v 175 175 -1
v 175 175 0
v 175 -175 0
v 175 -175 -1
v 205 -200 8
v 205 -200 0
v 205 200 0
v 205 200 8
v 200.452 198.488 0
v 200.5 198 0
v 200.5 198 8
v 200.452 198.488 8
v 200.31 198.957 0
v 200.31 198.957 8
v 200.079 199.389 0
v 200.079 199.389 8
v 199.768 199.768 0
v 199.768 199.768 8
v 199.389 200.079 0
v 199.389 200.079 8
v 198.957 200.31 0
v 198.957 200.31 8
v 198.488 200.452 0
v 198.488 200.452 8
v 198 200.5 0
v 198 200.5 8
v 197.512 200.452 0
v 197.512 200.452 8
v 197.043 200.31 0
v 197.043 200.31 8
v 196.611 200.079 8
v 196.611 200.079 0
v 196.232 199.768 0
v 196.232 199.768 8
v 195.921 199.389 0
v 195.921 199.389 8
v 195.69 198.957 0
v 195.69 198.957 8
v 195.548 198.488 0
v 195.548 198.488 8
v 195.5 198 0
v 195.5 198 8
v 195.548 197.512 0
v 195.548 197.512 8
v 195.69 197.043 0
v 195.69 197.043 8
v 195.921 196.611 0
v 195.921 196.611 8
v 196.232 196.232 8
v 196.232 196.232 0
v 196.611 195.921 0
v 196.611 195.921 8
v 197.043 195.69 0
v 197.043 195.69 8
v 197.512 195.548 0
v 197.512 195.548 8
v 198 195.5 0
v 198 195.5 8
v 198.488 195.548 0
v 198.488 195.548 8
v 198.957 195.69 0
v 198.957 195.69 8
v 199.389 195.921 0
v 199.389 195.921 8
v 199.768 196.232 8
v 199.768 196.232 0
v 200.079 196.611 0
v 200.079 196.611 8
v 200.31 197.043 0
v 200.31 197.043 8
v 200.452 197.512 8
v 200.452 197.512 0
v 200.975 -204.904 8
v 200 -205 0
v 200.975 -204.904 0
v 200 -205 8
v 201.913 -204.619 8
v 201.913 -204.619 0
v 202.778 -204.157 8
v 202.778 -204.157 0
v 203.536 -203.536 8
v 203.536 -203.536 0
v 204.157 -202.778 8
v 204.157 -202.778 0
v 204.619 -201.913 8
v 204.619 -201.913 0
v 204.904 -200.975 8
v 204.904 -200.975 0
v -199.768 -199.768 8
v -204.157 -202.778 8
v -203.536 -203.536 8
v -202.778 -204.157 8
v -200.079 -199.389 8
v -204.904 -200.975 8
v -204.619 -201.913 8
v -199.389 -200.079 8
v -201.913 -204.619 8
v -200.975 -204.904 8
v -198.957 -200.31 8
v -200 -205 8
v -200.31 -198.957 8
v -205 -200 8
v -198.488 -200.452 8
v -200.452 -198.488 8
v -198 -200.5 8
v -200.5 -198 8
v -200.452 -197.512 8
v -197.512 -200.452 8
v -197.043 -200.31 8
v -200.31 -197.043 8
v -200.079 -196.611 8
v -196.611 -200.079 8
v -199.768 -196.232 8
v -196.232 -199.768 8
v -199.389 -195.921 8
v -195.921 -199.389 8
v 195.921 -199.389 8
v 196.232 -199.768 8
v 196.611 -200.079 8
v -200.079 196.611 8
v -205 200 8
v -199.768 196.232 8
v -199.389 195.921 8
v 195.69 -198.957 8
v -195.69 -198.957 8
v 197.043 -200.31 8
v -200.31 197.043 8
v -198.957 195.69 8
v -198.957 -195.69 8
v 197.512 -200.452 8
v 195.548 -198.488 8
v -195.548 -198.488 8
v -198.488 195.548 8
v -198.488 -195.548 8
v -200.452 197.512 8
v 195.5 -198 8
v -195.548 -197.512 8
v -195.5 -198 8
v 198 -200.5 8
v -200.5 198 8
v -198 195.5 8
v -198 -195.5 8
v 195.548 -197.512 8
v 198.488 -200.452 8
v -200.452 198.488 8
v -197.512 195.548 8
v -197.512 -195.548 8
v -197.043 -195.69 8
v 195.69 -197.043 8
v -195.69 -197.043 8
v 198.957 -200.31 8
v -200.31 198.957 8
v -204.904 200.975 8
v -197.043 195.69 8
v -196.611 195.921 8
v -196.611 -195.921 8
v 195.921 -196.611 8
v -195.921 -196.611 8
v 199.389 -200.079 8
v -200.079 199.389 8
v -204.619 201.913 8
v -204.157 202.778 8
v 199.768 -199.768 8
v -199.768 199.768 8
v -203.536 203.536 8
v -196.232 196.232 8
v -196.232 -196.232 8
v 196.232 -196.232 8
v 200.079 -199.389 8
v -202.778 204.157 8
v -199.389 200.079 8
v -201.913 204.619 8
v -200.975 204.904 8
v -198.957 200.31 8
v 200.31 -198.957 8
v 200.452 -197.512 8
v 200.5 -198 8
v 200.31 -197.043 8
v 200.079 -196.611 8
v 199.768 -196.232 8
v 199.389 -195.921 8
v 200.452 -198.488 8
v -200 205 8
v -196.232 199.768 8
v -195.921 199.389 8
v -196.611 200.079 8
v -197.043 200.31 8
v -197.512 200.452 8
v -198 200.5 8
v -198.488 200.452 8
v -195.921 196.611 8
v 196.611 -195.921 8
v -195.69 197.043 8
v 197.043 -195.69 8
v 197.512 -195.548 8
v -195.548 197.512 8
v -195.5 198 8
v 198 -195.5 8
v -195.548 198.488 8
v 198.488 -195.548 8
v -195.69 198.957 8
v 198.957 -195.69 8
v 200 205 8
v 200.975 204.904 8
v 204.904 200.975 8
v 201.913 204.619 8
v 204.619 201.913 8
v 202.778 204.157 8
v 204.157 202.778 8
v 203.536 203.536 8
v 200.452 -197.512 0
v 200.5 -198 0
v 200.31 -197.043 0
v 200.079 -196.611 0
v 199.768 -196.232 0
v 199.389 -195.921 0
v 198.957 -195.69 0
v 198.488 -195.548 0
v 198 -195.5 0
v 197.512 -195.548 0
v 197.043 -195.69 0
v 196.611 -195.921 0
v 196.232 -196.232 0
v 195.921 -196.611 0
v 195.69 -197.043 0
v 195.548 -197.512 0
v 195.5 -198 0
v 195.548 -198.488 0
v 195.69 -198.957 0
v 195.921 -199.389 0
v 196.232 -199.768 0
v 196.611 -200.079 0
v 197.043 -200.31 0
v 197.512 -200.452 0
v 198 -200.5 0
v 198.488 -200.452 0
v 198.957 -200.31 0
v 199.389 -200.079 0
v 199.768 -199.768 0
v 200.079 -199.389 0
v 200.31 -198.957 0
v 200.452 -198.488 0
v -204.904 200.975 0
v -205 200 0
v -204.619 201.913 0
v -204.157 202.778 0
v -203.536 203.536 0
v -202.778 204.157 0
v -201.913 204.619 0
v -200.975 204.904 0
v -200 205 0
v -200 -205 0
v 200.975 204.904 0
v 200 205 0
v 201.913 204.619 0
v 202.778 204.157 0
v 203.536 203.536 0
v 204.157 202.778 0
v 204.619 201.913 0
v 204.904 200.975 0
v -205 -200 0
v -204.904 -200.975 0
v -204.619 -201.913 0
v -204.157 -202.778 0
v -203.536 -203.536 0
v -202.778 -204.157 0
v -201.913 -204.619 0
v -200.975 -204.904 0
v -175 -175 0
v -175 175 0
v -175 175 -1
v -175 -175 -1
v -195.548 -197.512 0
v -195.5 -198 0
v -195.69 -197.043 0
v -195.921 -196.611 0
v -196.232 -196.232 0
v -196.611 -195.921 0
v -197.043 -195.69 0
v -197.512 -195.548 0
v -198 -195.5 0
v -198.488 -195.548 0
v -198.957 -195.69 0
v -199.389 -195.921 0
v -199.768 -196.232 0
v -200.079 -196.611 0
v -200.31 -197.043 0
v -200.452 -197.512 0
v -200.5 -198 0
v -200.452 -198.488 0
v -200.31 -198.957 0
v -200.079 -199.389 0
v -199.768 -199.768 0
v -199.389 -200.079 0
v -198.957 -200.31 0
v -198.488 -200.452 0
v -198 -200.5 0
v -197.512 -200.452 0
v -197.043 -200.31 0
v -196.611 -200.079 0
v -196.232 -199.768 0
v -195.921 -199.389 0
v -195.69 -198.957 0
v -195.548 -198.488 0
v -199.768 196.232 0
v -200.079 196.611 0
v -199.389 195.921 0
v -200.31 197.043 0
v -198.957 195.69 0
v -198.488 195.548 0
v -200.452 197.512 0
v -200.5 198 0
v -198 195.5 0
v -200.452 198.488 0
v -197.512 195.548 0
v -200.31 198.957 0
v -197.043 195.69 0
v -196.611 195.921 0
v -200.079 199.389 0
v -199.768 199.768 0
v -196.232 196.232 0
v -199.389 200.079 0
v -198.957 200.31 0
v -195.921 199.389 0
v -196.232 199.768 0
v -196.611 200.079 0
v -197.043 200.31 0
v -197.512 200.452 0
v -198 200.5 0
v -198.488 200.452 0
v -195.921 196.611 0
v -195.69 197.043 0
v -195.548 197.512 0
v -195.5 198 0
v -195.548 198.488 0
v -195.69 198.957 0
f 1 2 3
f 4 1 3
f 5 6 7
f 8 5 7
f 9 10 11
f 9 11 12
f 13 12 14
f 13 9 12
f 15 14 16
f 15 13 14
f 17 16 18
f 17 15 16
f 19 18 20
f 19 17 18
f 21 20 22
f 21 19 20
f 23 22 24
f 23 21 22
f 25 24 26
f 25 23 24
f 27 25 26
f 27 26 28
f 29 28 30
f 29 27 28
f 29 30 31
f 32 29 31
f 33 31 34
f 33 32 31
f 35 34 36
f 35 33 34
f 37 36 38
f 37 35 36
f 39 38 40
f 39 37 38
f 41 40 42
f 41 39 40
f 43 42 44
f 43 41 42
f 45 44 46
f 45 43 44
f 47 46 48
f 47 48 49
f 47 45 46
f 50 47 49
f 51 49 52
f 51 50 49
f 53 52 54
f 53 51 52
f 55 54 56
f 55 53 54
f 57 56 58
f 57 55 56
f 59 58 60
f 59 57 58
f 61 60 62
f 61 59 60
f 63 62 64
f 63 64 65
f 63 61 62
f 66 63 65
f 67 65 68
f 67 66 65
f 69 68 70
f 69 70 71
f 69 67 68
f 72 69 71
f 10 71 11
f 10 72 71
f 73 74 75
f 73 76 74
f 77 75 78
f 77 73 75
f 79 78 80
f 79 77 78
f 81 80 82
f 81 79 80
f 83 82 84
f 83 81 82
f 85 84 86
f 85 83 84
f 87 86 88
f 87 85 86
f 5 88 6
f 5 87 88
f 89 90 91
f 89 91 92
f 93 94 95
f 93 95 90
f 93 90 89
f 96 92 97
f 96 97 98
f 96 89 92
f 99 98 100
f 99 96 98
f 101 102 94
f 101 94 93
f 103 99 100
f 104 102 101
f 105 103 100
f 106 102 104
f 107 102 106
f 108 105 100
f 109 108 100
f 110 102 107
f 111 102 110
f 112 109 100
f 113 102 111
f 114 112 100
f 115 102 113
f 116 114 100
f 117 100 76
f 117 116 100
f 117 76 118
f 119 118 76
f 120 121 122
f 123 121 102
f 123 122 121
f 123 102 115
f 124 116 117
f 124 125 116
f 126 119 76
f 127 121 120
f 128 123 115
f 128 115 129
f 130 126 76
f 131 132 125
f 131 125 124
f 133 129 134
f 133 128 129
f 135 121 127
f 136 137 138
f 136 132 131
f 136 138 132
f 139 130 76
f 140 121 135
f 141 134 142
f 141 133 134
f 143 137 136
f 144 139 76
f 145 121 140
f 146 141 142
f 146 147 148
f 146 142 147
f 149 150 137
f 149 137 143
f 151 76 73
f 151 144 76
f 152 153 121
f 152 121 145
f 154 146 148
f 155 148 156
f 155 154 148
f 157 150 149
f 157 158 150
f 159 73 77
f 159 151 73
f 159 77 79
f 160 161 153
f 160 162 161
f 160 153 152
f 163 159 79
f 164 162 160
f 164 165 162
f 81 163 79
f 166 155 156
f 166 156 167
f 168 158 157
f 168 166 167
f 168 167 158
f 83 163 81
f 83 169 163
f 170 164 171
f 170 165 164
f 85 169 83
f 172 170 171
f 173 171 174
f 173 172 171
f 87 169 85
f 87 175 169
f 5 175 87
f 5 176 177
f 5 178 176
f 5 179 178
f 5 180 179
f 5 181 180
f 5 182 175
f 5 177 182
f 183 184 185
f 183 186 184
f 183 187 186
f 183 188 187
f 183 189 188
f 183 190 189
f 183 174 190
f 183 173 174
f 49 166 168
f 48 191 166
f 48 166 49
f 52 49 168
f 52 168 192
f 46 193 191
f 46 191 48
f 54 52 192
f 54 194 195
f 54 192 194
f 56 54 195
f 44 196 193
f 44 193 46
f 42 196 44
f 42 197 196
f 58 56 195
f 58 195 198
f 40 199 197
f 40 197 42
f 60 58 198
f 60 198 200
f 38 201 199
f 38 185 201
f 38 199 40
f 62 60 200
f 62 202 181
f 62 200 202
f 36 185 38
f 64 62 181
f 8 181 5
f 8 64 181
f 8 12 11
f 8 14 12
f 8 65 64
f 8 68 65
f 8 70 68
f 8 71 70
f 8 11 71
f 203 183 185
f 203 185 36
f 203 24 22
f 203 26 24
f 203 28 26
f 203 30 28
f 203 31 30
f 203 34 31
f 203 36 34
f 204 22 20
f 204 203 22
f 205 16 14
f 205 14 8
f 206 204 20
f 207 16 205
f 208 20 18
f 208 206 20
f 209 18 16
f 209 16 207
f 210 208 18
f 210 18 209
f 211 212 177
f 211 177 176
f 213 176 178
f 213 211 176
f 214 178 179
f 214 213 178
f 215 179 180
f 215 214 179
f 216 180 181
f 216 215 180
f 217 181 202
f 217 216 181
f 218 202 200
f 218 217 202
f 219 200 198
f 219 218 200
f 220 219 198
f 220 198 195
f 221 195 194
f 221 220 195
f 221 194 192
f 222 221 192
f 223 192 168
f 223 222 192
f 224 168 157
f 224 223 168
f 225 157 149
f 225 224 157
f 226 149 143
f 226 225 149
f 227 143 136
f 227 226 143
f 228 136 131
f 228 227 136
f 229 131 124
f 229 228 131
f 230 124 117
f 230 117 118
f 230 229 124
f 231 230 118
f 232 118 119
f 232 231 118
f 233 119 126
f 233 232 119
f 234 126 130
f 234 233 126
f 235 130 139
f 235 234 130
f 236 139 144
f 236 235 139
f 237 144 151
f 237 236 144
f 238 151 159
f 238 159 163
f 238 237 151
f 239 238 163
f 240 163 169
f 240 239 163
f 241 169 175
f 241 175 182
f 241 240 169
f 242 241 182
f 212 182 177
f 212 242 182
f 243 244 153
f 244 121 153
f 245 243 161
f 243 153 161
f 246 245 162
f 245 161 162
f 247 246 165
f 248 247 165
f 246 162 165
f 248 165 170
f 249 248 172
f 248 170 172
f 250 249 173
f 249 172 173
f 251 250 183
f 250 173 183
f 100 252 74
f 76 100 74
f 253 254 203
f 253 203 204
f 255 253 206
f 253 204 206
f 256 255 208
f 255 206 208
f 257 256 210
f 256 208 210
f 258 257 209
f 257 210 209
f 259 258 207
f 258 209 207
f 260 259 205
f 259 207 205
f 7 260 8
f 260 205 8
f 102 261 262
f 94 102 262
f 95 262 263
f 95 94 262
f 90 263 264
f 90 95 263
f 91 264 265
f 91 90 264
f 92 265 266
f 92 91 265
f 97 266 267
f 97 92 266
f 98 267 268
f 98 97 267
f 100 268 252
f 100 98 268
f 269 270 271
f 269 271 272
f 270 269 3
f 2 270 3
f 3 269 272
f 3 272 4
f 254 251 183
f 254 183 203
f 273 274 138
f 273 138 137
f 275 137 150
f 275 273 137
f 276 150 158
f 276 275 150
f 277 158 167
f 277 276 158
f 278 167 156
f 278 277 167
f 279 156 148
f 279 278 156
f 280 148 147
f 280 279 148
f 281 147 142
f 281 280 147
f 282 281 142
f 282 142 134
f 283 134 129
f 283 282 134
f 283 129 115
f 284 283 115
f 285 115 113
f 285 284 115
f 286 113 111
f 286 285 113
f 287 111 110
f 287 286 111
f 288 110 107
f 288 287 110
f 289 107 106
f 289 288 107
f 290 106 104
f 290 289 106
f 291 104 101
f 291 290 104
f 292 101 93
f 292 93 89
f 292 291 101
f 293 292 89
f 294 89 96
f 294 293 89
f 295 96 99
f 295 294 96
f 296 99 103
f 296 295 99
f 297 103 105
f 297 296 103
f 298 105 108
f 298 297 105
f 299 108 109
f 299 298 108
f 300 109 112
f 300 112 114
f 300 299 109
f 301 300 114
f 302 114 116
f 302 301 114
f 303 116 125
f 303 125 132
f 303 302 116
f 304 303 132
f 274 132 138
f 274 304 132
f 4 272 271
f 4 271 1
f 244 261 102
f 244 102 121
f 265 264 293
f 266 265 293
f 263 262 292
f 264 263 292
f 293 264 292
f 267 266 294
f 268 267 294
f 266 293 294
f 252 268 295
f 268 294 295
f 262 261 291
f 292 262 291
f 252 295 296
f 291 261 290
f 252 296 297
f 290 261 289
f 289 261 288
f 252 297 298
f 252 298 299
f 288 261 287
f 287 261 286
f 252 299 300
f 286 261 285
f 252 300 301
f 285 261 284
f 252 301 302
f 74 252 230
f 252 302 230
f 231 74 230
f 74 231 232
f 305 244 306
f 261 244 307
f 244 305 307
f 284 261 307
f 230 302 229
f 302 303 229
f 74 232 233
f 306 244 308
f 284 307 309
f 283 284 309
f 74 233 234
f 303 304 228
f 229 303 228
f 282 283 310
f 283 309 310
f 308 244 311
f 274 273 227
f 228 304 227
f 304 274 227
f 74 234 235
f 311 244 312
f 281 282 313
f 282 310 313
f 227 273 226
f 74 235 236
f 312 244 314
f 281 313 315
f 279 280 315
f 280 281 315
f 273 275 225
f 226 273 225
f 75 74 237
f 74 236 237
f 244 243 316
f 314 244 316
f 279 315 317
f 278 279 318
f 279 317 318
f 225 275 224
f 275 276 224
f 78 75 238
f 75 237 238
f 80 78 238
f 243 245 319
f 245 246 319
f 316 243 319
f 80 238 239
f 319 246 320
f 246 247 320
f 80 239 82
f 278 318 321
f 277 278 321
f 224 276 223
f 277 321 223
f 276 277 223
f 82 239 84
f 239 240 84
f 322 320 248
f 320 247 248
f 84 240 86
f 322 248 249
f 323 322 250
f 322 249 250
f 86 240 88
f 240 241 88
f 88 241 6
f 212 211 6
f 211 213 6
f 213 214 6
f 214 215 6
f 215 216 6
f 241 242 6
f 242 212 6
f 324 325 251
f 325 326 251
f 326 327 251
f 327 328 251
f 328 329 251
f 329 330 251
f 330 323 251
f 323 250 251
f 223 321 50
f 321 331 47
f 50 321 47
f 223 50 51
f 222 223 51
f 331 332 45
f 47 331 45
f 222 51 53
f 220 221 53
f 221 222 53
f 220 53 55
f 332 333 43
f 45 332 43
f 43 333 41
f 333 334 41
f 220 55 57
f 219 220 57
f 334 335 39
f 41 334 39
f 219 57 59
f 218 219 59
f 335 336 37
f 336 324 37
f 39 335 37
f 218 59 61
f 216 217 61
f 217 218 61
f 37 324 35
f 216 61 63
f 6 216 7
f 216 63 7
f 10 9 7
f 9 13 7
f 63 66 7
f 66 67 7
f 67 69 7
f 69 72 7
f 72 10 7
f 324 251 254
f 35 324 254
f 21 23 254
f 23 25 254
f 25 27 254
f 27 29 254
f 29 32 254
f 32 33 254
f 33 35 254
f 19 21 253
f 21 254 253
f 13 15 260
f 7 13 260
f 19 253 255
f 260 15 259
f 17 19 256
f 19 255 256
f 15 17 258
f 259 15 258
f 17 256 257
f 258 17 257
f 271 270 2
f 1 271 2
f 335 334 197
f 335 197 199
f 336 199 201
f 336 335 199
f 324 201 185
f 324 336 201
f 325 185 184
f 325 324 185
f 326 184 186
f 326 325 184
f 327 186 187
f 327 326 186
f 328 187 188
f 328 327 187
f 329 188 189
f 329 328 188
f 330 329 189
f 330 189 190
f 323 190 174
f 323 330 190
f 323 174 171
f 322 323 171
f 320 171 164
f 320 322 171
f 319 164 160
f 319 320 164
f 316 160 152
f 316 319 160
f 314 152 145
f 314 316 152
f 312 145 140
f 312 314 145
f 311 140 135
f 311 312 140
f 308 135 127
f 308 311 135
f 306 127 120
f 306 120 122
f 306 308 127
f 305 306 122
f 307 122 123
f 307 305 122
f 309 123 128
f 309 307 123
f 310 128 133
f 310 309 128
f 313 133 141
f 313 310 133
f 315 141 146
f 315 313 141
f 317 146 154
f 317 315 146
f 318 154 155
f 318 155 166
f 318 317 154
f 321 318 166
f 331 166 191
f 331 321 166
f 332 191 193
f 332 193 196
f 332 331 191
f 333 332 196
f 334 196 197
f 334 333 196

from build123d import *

# Parameters (mm, degrees)
F0_W     = 410
F0_H     = 410
F0_R     = 2.5
F1_DEPTH = 8
F2_R     = 5
F3_W     = 350
F3_H     = 350
F4_DEPTH = 1


with BuildPart() as f1:
    # F0 (on Top) → F1 (new body)
    with BuildSketch(Plane.XY):
        Rectangle(F0_W, F0_H)
        with Locations((-198, -198)):
            Circle(F0_R, mode=Mode.SUBTRACT)
        with Locations((198, -198)):
            Circle(F0_R, mode=Mode.SUBTRACT)
        with Locations((-198, 198)):
            Circle(F0_R, mode=Mode.SUBTRACT)
        with Locations((198, 198)):
            Circle(F0_R, mode=Mode.SUBTRACT)
    extrude(amount=F1_DEPTH)

    # F2
    f2_edges = [f1.edges().sort_by_distance(p)[0] for p in [
        (-205, -205, 4),
        (205, -205, 4),
        (205, 205, 4),
        (-205, 205, 4),
    ]]
    fillet(f2_edges, radius=F2_R)


with BuildPart() as f4:
    # F3 (on face) → F4 (new body)
    with BuildSketch(Plane(origin=(0, 0, 0), x_dir=(1, 0, 0), z_dir=(0, 0, -1))):
        Rectangle(F3_W, F3_H)
    extrude(amount=F4_DEPTH)


solid = Compound([f1.part, f4.part])
